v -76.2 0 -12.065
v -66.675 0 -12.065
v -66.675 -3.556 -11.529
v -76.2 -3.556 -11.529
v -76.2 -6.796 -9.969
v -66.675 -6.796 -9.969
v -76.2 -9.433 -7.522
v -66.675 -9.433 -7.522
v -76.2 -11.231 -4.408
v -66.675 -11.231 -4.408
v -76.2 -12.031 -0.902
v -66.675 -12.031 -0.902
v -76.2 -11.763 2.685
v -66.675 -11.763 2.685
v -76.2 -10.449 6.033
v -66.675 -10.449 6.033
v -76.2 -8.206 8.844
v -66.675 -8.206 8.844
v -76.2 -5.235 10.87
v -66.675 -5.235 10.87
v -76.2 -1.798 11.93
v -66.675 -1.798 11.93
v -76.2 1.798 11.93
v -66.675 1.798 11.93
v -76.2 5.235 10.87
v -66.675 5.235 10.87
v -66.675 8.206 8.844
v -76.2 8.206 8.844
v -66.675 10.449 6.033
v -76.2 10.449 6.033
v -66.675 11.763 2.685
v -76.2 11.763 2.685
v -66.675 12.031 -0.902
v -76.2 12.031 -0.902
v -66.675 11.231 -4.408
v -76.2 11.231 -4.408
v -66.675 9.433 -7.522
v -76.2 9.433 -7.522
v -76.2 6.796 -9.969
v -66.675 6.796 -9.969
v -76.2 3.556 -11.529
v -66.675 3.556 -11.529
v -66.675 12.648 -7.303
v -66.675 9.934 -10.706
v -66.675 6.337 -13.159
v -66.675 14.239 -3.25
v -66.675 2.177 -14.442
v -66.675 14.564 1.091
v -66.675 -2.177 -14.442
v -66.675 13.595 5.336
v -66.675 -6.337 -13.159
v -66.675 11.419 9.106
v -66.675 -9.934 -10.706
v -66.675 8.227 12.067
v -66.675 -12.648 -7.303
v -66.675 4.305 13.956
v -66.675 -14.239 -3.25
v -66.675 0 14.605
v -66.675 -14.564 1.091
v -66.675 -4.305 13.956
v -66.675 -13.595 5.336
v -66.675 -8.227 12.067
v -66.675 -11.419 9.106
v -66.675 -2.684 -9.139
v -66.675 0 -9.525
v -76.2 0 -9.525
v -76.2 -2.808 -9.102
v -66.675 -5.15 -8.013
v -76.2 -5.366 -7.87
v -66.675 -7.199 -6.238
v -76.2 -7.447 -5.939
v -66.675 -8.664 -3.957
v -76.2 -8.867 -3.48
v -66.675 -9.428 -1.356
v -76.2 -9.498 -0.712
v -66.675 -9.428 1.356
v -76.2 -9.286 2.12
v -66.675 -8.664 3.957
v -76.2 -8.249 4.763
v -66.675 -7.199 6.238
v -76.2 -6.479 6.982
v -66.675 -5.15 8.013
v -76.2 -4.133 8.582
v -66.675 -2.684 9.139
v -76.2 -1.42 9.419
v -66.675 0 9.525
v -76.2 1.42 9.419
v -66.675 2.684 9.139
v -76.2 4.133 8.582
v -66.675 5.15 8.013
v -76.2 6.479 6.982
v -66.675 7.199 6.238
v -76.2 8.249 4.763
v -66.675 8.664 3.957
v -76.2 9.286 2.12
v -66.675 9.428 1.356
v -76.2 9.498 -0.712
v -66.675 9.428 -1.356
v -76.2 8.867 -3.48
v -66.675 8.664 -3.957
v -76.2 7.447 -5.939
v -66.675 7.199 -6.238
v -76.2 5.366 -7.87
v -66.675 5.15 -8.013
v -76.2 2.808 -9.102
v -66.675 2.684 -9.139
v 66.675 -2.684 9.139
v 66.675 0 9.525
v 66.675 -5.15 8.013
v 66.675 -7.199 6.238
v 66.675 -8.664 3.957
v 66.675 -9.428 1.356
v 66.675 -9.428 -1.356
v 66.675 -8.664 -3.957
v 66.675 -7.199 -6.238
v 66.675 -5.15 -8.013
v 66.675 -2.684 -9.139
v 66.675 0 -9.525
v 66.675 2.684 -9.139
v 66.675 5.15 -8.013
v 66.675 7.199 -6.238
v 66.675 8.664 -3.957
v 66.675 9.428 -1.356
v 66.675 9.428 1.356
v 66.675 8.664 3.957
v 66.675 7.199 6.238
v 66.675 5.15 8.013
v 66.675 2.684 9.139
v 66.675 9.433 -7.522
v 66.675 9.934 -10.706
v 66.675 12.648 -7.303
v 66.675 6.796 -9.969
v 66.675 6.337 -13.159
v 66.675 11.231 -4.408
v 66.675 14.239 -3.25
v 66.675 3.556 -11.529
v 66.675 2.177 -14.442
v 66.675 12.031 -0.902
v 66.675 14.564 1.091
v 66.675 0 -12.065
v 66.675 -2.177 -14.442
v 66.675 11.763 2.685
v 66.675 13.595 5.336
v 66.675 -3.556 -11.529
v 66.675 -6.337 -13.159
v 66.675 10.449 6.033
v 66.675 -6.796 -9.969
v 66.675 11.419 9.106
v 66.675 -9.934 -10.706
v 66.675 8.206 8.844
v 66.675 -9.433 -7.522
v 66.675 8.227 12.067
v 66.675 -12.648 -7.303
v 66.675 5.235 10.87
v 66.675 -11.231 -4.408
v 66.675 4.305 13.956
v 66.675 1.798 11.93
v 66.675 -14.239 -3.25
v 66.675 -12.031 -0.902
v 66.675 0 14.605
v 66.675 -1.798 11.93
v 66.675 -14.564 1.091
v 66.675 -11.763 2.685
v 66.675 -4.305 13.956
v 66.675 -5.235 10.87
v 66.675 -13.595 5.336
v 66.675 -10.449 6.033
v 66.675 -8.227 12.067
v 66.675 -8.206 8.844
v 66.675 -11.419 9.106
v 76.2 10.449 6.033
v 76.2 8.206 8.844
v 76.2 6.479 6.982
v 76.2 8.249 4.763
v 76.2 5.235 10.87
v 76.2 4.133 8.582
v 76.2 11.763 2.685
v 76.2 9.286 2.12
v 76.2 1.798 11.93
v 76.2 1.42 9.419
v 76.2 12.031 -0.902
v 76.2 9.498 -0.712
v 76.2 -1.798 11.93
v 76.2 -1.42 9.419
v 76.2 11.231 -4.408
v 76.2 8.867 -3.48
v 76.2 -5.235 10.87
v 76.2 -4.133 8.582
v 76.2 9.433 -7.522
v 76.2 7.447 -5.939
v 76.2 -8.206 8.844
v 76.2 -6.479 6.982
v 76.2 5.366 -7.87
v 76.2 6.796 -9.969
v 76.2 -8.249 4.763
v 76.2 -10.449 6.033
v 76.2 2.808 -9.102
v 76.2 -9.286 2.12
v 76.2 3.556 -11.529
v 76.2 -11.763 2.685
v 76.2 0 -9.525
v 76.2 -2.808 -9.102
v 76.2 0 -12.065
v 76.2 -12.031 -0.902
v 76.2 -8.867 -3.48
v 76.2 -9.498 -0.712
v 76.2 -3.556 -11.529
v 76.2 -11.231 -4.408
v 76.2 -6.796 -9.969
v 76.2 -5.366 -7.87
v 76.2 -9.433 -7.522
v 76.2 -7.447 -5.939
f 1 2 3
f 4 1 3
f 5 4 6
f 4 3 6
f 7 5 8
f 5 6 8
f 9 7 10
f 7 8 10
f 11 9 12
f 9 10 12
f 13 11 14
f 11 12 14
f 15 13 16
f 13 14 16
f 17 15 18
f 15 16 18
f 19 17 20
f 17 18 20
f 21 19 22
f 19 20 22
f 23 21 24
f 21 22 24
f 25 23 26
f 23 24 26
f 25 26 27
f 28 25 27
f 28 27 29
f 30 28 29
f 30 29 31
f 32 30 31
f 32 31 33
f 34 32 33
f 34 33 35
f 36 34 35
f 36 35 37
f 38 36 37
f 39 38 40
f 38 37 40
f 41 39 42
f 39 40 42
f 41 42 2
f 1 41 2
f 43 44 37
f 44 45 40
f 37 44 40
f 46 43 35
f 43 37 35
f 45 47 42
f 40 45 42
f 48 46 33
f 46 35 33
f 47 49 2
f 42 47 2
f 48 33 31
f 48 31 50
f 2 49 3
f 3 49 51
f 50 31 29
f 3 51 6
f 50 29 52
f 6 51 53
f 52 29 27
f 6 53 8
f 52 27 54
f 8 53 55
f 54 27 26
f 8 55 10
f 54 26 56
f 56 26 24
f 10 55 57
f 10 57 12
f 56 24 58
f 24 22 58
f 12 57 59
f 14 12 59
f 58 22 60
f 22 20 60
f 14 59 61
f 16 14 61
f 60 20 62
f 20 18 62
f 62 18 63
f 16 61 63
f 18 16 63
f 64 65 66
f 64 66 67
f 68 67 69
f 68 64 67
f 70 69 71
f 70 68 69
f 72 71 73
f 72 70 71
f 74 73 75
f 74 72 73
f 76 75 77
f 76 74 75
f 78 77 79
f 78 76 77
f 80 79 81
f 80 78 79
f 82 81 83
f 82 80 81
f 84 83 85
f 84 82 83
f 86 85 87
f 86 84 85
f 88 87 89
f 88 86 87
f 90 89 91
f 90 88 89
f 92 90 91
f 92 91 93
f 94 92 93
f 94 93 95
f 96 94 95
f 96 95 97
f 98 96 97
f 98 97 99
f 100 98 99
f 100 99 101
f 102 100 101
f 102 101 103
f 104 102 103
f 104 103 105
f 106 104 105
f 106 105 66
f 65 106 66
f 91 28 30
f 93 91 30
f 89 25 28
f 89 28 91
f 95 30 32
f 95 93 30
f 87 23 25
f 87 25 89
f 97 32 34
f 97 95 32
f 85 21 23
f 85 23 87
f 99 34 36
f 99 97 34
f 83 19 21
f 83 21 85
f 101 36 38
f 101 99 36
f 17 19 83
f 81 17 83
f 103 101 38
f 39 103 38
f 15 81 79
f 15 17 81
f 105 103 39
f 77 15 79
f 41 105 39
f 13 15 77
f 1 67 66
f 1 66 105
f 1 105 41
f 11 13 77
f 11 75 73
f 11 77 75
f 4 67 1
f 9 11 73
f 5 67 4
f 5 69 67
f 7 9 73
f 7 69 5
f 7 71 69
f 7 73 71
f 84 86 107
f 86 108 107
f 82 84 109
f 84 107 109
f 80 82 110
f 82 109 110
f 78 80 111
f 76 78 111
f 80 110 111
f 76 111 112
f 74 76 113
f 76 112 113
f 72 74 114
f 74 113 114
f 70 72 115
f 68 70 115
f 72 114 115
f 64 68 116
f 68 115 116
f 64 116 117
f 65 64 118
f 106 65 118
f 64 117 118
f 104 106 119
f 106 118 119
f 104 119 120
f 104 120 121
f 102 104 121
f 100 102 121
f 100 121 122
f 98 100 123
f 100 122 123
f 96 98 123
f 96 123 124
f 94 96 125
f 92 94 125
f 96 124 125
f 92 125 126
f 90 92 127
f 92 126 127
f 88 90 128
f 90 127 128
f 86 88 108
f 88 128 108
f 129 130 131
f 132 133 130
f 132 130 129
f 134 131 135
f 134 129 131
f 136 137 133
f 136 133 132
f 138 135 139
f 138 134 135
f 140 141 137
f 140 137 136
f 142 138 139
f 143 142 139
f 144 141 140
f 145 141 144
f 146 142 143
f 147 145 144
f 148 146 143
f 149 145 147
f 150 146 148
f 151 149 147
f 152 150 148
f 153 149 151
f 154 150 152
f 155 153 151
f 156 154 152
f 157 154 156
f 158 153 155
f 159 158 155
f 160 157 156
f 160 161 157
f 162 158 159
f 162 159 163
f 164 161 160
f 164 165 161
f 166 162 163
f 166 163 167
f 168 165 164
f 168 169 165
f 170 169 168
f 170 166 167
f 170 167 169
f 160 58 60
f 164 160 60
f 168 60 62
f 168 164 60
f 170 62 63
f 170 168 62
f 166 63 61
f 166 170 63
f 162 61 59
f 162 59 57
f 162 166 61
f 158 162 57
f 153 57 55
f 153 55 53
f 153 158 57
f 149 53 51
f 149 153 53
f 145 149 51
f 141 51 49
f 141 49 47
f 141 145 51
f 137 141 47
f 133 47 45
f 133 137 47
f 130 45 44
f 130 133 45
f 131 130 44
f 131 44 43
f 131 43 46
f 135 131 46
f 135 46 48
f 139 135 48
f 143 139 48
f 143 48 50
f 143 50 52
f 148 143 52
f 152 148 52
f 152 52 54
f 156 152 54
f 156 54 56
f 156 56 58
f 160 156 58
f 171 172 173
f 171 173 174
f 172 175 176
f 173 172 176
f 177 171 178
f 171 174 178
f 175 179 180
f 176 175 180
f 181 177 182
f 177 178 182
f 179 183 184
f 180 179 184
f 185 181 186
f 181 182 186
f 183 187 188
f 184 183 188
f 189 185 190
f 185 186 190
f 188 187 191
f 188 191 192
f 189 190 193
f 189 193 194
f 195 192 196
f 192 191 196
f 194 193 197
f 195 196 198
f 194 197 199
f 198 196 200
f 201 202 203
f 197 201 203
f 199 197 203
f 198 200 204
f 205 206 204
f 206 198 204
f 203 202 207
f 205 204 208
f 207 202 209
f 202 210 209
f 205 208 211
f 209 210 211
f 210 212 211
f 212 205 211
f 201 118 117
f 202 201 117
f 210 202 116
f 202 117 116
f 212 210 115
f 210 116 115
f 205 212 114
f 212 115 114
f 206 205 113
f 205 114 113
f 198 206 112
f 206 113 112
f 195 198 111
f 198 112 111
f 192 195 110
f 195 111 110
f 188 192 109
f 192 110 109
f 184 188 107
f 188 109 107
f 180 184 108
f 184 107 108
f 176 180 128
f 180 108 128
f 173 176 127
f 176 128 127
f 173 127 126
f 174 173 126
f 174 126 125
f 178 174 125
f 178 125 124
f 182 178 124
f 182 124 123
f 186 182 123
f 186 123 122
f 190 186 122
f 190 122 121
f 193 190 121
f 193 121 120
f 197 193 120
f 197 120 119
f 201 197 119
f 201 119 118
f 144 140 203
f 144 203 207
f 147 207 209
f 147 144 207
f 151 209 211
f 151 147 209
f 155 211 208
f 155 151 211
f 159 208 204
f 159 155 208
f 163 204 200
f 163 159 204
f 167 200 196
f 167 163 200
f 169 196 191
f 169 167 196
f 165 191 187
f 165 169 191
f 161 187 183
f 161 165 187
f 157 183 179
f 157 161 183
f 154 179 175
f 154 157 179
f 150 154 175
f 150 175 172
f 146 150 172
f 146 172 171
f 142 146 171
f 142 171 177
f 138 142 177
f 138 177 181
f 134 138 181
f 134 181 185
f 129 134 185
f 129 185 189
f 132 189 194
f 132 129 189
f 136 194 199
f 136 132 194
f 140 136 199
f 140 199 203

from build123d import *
from build123d.topology import SkipClean

# Parameters (mm, degrees)
SWEEP_THIN1_PROFILE_R   = 14.605
SWEEP_THIN1_PROFILE_R_2 = 9.525
SKETCH15_R              = 12.065
SKETCH15_R_2            = 9.525
BOSS_EXTRUDE2_DEPTH     = 9.525


with BuildPart() as part:
    # Sweep-Thin1: sweep along a curve in space
    with BuildLine() as sweep_thin1_path:
        Line((-66.675, 0, 0), (66.675, 0, 0))
    # Sweep-Thin1 profile (on start of the path) → Sweep-Thin1 (sweep)
    with BuildSketch(Plane(origin=(-66.675, 0, 0), x_dir=(0, 0, 1), z_dir=(1, 0, 0))):
        Circle(SWEEP_THIN1_PROFILE_R)
        Circle(SWEEP_THIN1_PROFILE_R_2, mode=Mode.SUBTRACT)
    sweep(path=sweep_thin1_path.line)

    # Sketch15 → Boss-Extrude2 (add)
    with SkipClean():  # the faces are left unmerged after this step: merging them gives an invalid solid
        with BuildSketch(Plane.ZY.offset(66.675)):
            with Locations(Location((0, 0, 0), (0, 0, 180))):
                Circle(SKETCH15_R)
            with Locations(Location((0, 0, 0), (0, 0, 180))):
                Circle(SKETCH15_R_2, mode=Mode.SUBTRACT)
        boss_extrude2 = extrude(amount=BOSS_EXTRUDE2_DEPTH)
    add(part.part.scale(1), mode=Mode.REPLACE)  # the faces are merged on a copy

    # Mirror1: Boss-Extrude2 across plane
    with SkipClean():  # the faces are left unmerged after this step: merging them gives an invalid solid
        add(boss_extrude2.mirror(Plane(origin=(0, 0, 0), x_dir=(0, 0, 1), z_dir=(1, 0, 0))))


solid = part.part
